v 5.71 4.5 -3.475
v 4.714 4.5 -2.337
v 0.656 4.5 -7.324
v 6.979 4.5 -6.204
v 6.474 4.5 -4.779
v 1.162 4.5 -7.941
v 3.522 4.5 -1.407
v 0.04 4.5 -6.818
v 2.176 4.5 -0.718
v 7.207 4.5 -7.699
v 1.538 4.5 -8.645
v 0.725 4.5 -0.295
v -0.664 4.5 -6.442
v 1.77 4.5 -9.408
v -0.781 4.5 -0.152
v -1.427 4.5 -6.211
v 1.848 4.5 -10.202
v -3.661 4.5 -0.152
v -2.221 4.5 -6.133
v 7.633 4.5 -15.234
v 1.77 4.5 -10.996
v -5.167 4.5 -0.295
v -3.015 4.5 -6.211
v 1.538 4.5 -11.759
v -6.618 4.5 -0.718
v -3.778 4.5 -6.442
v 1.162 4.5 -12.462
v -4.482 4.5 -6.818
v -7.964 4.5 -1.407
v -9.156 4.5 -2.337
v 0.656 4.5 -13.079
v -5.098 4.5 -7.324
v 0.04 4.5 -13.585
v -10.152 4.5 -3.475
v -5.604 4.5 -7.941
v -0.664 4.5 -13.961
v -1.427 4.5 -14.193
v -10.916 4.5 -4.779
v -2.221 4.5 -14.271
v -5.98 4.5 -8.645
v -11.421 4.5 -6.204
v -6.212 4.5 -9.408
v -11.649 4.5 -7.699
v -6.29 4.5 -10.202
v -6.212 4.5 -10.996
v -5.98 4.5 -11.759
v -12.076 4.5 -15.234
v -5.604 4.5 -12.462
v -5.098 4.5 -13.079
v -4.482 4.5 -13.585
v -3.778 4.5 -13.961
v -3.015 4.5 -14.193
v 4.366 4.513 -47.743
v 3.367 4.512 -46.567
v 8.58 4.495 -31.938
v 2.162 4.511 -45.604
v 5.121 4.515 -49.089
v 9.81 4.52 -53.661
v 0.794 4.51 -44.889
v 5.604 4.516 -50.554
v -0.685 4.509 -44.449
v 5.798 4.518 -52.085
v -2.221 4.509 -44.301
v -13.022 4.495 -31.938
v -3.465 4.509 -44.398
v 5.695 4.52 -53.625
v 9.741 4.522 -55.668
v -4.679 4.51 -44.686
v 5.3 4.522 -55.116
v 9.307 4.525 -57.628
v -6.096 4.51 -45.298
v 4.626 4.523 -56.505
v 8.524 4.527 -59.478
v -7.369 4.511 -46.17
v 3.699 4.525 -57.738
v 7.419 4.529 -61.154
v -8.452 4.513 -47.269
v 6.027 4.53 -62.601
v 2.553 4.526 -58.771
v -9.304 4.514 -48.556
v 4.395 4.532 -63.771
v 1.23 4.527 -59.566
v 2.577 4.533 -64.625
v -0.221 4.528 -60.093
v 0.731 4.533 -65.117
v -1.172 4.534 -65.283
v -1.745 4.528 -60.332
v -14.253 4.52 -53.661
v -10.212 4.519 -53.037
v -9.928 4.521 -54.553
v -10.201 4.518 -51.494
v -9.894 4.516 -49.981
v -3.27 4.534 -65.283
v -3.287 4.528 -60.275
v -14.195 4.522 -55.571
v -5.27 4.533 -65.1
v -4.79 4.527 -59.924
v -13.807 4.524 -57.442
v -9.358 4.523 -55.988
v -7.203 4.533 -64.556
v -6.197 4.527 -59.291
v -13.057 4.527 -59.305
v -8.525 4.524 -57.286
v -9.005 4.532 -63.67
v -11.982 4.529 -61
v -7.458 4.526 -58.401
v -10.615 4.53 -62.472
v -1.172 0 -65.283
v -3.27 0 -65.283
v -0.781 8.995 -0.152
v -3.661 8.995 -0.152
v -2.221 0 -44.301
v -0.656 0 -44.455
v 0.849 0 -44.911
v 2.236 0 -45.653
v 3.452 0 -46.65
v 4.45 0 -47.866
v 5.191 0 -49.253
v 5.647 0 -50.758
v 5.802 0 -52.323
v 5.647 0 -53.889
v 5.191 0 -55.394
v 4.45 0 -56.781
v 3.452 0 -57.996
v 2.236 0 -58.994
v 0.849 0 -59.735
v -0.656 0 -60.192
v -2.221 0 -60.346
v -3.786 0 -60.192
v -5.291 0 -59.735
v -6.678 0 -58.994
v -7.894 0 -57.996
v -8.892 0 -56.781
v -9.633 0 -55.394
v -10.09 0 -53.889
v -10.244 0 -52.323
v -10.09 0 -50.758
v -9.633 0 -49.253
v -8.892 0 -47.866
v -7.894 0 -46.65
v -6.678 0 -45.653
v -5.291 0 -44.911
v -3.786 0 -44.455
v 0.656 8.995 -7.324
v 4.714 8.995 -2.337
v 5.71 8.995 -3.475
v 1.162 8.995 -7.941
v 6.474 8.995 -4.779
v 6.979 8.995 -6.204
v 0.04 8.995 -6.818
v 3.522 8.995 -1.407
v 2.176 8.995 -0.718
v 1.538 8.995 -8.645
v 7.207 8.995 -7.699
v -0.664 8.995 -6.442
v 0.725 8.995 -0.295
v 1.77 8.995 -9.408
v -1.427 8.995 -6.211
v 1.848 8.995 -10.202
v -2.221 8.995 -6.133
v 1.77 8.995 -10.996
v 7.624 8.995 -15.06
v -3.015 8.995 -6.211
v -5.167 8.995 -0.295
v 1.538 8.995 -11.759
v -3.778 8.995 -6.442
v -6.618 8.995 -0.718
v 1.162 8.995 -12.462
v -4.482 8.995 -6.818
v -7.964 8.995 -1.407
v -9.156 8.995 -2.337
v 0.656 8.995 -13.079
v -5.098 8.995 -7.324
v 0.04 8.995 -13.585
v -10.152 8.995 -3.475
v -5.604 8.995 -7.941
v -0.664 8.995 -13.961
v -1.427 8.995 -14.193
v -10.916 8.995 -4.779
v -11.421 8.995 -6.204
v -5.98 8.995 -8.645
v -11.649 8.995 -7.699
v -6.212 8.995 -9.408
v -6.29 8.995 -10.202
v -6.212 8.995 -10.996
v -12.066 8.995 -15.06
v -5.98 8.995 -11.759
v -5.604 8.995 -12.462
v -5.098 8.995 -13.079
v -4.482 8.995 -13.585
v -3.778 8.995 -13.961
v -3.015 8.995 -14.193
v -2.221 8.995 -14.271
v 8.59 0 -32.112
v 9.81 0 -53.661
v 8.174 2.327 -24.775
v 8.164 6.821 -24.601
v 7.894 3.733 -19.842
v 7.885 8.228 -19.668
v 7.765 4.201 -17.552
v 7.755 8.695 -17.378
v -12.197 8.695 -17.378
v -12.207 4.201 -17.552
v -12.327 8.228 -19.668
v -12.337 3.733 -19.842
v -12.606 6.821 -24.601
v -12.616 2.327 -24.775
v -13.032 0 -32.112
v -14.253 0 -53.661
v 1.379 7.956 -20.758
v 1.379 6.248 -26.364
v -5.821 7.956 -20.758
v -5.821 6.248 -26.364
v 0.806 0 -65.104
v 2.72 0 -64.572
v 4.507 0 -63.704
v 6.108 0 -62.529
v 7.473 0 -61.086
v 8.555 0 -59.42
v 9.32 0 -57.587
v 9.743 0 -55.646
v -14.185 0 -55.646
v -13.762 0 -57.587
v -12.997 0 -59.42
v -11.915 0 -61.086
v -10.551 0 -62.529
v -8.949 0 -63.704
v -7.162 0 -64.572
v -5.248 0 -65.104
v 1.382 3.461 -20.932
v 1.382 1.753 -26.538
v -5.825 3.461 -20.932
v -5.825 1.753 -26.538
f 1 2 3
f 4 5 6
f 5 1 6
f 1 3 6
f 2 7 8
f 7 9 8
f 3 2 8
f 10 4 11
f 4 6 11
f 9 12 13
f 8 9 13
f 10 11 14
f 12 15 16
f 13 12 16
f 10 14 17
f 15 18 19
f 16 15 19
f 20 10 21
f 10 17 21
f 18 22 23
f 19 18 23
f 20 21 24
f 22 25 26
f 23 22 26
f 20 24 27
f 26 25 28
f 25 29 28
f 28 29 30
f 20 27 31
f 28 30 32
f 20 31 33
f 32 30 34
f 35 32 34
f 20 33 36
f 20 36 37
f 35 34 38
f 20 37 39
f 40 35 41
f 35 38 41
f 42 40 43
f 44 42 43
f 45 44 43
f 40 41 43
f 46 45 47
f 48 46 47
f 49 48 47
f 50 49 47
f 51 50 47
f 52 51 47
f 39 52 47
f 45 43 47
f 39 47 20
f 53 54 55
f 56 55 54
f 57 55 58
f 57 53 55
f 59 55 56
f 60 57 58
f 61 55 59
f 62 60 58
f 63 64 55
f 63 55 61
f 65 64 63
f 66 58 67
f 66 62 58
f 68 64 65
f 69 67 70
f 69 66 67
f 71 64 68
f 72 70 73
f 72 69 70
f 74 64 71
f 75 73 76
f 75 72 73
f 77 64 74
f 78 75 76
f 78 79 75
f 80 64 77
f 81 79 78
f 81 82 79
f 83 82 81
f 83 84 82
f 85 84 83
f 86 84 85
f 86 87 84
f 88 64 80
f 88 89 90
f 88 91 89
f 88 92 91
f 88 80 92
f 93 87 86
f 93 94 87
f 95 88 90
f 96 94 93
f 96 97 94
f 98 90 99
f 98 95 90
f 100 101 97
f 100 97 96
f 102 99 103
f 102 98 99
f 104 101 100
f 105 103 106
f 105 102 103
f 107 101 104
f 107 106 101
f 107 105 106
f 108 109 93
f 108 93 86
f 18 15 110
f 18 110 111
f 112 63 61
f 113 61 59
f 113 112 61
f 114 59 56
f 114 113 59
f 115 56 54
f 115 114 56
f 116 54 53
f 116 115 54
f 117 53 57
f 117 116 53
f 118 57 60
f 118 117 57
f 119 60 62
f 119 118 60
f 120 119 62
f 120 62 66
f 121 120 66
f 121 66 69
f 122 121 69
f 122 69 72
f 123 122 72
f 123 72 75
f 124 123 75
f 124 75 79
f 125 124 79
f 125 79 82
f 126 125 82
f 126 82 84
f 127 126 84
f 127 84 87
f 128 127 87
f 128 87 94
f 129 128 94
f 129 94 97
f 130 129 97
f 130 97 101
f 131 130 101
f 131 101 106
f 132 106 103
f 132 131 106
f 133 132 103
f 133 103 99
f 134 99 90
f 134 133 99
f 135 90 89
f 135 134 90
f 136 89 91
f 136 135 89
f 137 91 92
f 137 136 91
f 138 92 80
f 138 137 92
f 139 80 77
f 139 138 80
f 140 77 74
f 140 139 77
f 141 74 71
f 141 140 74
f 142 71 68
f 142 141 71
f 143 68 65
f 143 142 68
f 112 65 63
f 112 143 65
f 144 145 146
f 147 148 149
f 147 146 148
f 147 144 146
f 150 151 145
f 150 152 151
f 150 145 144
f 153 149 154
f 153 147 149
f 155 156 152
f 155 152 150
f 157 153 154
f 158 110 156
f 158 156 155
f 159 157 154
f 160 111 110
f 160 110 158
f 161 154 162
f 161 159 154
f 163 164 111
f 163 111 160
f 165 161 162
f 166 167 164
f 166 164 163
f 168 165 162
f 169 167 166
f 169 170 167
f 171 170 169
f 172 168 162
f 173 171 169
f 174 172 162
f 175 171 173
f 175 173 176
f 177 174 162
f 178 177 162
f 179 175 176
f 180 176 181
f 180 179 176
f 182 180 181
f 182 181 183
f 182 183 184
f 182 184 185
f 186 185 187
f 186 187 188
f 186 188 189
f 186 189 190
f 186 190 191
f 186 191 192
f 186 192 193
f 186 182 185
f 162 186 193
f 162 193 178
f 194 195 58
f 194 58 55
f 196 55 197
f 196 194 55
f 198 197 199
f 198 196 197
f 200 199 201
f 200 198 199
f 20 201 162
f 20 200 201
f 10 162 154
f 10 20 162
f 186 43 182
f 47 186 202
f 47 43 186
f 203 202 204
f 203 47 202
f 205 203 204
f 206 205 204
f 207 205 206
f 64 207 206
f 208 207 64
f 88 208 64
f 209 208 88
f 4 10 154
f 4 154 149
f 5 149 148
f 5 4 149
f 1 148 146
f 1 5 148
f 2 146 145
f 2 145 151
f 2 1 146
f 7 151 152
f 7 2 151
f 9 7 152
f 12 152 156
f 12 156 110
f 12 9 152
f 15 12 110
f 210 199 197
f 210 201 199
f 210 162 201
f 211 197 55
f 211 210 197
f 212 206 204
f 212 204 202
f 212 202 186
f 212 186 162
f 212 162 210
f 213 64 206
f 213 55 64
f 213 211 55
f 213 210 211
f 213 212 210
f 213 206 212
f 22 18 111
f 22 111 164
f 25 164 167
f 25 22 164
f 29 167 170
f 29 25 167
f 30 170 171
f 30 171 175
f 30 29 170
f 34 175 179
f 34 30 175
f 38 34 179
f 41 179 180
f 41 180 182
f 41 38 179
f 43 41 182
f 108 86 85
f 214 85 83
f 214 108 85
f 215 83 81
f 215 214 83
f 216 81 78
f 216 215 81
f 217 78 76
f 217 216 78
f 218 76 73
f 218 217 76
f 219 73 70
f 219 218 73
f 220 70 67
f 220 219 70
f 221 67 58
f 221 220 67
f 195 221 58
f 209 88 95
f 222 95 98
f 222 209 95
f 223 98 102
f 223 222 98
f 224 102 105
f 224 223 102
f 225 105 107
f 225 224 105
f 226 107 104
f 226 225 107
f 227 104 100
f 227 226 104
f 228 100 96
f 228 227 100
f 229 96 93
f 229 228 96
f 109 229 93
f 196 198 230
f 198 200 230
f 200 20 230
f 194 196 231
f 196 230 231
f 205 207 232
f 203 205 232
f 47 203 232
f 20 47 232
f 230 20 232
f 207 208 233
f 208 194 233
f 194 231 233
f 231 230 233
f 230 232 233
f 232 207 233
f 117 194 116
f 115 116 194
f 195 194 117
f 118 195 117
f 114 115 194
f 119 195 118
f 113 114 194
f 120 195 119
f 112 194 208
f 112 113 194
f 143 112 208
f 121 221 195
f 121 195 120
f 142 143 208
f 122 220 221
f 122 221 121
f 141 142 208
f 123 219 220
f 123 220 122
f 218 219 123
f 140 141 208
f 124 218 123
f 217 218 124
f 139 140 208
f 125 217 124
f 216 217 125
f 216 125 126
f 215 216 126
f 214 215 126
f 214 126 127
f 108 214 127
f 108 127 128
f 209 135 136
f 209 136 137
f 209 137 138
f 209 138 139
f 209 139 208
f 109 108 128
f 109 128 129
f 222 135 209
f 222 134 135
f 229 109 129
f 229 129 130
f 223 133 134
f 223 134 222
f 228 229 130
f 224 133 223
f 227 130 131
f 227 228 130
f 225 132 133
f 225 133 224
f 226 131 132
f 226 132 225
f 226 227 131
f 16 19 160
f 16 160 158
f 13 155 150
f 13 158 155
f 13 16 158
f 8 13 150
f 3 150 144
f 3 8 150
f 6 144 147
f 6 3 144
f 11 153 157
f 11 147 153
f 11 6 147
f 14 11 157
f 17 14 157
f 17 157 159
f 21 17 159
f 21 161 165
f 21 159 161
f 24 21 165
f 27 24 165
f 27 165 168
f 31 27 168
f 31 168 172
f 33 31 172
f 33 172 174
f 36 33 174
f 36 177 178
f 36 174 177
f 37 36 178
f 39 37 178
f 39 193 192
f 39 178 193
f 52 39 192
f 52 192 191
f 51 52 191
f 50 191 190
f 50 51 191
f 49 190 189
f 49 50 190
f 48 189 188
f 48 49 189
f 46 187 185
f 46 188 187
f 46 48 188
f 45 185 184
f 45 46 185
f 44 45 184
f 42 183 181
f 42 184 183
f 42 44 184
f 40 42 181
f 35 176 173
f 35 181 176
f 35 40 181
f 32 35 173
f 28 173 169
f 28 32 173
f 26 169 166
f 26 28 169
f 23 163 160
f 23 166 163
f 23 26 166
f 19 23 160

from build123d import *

# Parameters (mm, degrees)
SKETCH1_R                = 8.022684963
SKETCH1_R_2              = 4.06906829
BOSS_EXTRUDE1_DEPTH      = 9
CUT_EXTRUDE2_DEPTH       = 80
CUT_EXTRUDE2_DEPTH_BACK  = 80
CUT_EXTRUDE15_DEPTH      = 68.428154516
CUT_EXTRUDE15_DEPTH_BACK = 68.428154516


with BuildPart() as part:
    # Sketch1 → Boss-Extrude1 (new body)
    with BuildSketch(Plane(origin=(0, 0, 0), x_dir=(1, 0, 0), z_dir=(0, 1, 0))):
        with BuildLine():
            Line((-2.221076805, 65.28335408), (-1.171915361, 65.28335408))
            ThreePointArc((-1.171915361, 65.28335408), (6.823214902, 61.838345283), (9.810473513, 53.661152641))
            Line((9.810473513, 53.661152641), (7.206522245, 7.699180155))
            ThreePointArc((7.206522245, 7.699180155), (4.713869394, 2.337050101), (-0.780669663, 0.151690292))
            Line((-0.780669663, 0.151690292), (-2.221076805, 0.151690292))
            Line((-2.221076805, 0.151690292), (-3.661483948, 0.151690292))
            ThreePointArc((-3.661483948, 0.151690292), (-9.156023005, 2.337050101), (-11.648675856, 7.699180155))
            Line((-11.648675856, 7.699180155), (-14.252627123, 53.661152641))
            ThreePointArc((-14.252627123, 53.661152641), (-11.265368512, 61.838345283), (-3.27023825, 65.28335408))
            Line((-3.27023825, 65.28335408), (-2.221076805, 65.28335408))
        make_face()
        with Locations((-2.221076805, 52.32335408)):
            Circle(SKETCH1_R, mode=Mode.SUBTRACT)
        with Locations((-2.221076805, 10.201686469)):
            Circle(SKETCH1_R_2, mode=Mode.SUBTRACT)
    extrude(amount=BOSS_EXTRUDE1_DEPTH)

    # Sketch2 → Cut-Extrude2 (cut, two sides: drawn at the far end of the back side and taken through both)
    with BuildSketch(Plane(origin=(0, 0, 0), x_dir=(0, 0, -1), z_dir=(1, 0, 0)).offset(-CUT_EXTRUDE2_DEPTH_BACK)):
        with BuildLine():
            Line((7.699180155, 4.5), (0.151690292, 4.5))
            Line((0.151690292, 4.5), (0.151690292, 0))
            Line((0.151690292, 0), (32.11164194, 0))
            add(Edge.make_bspline(
                [(15.233518693, 4.5), (20.997577491, 4.003468068), (26.535168731, 1.567737081), (32.11164194, 0)],
                knots=[0.310739068, 0.310739068, 0.310739068, 0.310739068, 1, 1, 1, 1], degree=3))
            Line((15.233518693, 4.5), (7.699180155, 4.5))
        make_face()
    extrude(amount=CUT_EXTRUDE2_DEPTH + CUT_EXTRUDE2_DEPTH_BACK, mode=Mode.SUBTRACT)

    # Sketch3 → Cut-Extrude15 (cut, two sides: drawn at the far end of the back side and taken through both)
    with BuildSketch(Plane(origin=(0, 0, 0), x_dir=(0, 0, -1), z_dir=(1, 0, 0)).offset(-CUT_EXTRUDE15_DEPTH_BACK)):
        with BuildLine():
            Line((65.441158073, 9.059719613), (65.441158073, 9.358577967))
            Line((65.441158073, 9.358577967), (15.059583295, 9.985835555))
            Line((15.059583295, 9.985835555), (14.793593064, 9.985835555))
            Line((14.793593064, 9.985835555), (0, 9.985835555))
            Line((0, 9.985835555), (0, 8.994860535))
            Line((0, 8.994860535), (15.059583295, 8.994860535))
            add(Edge.make_bspline(
                [(15.059583295, 8.994860535), (20.823642093, 8.498328604), (26.361233333, 6.062597616), (31.937706542, 4.494860535)],
                knots=[0.310739068, 0.310739068, 0.310739068, 0.310739068, 1, 1, 1, 1], degree=3))
            Line((31.937706542, 4.494860535), (65.441158073, 4.533727355))
            Line((65.441158073, 4.533727355), (65.441158073, 9.059719613))
        make_face()
    extrude(amount=CUT_EXTRUDE15_DEPTH + CUT_EXTRUDE15_DEPTH_BACK, mode=Mode.SUBTRACT)


solid = part.part
